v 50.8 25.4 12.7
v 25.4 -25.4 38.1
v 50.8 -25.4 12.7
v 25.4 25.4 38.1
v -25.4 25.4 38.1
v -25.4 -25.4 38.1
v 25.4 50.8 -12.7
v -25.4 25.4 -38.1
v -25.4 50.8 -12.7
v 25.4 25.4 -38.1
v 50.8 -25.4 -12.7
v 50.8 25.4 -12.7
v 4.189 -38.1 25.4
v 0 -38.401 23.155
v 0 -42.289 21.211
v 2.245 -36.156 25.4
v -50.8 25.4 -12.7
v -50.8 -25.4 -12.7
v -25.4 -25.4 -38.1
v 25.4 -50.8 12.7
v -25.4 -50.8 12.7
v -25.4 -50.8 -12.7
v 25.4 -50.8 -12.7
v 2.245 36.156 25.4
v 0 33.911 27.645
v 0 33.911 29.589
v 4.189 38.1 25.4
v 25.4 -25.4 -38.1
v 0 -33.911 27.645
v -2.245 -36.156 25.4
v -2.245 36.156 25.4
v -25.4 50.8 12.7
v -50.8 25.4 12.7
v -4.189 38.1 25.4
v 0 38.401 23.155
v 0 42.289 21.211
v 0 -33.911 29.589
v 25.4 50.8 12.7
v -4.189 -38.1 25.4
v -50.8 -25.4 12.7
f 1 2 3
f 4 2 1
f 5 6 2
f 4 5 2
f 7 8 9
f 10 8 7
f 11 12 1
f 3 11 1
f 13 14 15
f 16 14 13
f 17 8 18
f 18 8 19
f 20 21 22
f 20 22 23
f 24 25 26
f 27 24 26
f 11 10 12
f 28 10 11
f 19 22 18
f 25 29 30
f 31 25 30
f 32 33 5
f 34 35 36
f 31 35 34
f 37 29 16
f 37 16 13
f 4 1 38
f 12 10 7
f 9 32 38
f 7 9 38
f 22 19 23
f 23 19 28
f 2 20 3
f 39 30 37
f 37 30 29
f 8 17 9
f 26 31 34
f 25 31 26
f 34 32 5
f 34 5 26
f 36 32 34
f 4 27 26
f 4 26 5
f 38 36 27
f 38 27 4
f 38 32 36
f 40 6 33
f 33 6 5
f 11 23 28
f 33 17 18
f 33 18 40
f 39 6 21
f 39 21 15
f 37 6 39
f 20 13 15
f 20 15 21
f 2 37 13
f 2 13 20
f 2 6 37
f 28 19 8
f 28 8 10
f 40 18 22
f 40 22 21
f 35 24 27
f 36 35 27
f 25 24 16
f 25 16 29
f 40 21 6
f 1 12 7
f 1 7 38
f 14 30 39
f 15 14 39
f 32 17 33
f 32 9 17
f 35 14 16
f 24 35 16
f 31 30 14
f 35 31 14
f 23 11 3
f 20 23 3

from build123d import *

# Parameters (mm, degrees)
F0_W     = 101.6
F0_H     = 76.2
F1_DEPTH = 50.8
F2_SIZE  = 25.4
F4_DEPTH = 76.2
F5_SIZE  = 1.5875
F6_SIZE  = 1.5875


with BuildPart() as f1:
    # F0 (on Front) → F1 (new body, symmetric)
    with BuildSketch(Plane.XZ):
        Rectangle(F0_W, F0_H)
    extrude(amount=F1_DEPTH, both=True)

    # F2
    f2_edges = [f1.edges().sort_by_distance(p)[0] for p in [
        (-50.8, -50.8, 0),
        (0, -50.8, -38.1),
        (50.8, -50.8, 0),
        (0, -50.8, 38.1),
        (-50.8, 50.8, 0),
        (-50.8, 0, -38.1),
        (-50.8, 0, 38.1),
        (0, 50.8, -38.1),
        (50.8, 0, -38.1),
        (50.8, 50.8, 0),
        (50.8, 0, 38.1),
        (0, 50.8, 38.1),
    ]]
    chamfer(f2_edges, length=F2_SIZE)

    # F3 (on Front) → F4 (cut, symmetric)
    with BuildSketch(Plane.XZ):
        Polygon((0, 27.6450640303), (-2.2450640303, 25.4), (0, 23.1549359697), (2.2450640303, 25.4), align=None)
    extrude(amount=F4_DEPTH, both=True, mode=Mode.SUBTRACT)

    # F5
    f5_edges = [f1.edges().sort_by_distance(p)[0] for p in [
        (1.122532, -39.222532, 24.277468),
        (-1.122532, -39.222532, 24.277468),
        (1.122532, 39.222532, 24.277468),
        (-1.122532, 39.222532, 24.277468),
    ]]
    chamfer(f5_edges, length=F5_SIZE)

    # F6
    f6_edges = [f1.edges().sort_by_distance(p)[0] for p in [
        (1.122532, -36.977468, 26.522532),
        (-1.122532, -36.977468, 26.522532),
        (-1.122532, 36.977468, 26.522532),
        (1.122532, 36.977468, 26.522532),
    ]]
    chamfer(f6_edges, length=F6_SIZE)


solid = f1.part
